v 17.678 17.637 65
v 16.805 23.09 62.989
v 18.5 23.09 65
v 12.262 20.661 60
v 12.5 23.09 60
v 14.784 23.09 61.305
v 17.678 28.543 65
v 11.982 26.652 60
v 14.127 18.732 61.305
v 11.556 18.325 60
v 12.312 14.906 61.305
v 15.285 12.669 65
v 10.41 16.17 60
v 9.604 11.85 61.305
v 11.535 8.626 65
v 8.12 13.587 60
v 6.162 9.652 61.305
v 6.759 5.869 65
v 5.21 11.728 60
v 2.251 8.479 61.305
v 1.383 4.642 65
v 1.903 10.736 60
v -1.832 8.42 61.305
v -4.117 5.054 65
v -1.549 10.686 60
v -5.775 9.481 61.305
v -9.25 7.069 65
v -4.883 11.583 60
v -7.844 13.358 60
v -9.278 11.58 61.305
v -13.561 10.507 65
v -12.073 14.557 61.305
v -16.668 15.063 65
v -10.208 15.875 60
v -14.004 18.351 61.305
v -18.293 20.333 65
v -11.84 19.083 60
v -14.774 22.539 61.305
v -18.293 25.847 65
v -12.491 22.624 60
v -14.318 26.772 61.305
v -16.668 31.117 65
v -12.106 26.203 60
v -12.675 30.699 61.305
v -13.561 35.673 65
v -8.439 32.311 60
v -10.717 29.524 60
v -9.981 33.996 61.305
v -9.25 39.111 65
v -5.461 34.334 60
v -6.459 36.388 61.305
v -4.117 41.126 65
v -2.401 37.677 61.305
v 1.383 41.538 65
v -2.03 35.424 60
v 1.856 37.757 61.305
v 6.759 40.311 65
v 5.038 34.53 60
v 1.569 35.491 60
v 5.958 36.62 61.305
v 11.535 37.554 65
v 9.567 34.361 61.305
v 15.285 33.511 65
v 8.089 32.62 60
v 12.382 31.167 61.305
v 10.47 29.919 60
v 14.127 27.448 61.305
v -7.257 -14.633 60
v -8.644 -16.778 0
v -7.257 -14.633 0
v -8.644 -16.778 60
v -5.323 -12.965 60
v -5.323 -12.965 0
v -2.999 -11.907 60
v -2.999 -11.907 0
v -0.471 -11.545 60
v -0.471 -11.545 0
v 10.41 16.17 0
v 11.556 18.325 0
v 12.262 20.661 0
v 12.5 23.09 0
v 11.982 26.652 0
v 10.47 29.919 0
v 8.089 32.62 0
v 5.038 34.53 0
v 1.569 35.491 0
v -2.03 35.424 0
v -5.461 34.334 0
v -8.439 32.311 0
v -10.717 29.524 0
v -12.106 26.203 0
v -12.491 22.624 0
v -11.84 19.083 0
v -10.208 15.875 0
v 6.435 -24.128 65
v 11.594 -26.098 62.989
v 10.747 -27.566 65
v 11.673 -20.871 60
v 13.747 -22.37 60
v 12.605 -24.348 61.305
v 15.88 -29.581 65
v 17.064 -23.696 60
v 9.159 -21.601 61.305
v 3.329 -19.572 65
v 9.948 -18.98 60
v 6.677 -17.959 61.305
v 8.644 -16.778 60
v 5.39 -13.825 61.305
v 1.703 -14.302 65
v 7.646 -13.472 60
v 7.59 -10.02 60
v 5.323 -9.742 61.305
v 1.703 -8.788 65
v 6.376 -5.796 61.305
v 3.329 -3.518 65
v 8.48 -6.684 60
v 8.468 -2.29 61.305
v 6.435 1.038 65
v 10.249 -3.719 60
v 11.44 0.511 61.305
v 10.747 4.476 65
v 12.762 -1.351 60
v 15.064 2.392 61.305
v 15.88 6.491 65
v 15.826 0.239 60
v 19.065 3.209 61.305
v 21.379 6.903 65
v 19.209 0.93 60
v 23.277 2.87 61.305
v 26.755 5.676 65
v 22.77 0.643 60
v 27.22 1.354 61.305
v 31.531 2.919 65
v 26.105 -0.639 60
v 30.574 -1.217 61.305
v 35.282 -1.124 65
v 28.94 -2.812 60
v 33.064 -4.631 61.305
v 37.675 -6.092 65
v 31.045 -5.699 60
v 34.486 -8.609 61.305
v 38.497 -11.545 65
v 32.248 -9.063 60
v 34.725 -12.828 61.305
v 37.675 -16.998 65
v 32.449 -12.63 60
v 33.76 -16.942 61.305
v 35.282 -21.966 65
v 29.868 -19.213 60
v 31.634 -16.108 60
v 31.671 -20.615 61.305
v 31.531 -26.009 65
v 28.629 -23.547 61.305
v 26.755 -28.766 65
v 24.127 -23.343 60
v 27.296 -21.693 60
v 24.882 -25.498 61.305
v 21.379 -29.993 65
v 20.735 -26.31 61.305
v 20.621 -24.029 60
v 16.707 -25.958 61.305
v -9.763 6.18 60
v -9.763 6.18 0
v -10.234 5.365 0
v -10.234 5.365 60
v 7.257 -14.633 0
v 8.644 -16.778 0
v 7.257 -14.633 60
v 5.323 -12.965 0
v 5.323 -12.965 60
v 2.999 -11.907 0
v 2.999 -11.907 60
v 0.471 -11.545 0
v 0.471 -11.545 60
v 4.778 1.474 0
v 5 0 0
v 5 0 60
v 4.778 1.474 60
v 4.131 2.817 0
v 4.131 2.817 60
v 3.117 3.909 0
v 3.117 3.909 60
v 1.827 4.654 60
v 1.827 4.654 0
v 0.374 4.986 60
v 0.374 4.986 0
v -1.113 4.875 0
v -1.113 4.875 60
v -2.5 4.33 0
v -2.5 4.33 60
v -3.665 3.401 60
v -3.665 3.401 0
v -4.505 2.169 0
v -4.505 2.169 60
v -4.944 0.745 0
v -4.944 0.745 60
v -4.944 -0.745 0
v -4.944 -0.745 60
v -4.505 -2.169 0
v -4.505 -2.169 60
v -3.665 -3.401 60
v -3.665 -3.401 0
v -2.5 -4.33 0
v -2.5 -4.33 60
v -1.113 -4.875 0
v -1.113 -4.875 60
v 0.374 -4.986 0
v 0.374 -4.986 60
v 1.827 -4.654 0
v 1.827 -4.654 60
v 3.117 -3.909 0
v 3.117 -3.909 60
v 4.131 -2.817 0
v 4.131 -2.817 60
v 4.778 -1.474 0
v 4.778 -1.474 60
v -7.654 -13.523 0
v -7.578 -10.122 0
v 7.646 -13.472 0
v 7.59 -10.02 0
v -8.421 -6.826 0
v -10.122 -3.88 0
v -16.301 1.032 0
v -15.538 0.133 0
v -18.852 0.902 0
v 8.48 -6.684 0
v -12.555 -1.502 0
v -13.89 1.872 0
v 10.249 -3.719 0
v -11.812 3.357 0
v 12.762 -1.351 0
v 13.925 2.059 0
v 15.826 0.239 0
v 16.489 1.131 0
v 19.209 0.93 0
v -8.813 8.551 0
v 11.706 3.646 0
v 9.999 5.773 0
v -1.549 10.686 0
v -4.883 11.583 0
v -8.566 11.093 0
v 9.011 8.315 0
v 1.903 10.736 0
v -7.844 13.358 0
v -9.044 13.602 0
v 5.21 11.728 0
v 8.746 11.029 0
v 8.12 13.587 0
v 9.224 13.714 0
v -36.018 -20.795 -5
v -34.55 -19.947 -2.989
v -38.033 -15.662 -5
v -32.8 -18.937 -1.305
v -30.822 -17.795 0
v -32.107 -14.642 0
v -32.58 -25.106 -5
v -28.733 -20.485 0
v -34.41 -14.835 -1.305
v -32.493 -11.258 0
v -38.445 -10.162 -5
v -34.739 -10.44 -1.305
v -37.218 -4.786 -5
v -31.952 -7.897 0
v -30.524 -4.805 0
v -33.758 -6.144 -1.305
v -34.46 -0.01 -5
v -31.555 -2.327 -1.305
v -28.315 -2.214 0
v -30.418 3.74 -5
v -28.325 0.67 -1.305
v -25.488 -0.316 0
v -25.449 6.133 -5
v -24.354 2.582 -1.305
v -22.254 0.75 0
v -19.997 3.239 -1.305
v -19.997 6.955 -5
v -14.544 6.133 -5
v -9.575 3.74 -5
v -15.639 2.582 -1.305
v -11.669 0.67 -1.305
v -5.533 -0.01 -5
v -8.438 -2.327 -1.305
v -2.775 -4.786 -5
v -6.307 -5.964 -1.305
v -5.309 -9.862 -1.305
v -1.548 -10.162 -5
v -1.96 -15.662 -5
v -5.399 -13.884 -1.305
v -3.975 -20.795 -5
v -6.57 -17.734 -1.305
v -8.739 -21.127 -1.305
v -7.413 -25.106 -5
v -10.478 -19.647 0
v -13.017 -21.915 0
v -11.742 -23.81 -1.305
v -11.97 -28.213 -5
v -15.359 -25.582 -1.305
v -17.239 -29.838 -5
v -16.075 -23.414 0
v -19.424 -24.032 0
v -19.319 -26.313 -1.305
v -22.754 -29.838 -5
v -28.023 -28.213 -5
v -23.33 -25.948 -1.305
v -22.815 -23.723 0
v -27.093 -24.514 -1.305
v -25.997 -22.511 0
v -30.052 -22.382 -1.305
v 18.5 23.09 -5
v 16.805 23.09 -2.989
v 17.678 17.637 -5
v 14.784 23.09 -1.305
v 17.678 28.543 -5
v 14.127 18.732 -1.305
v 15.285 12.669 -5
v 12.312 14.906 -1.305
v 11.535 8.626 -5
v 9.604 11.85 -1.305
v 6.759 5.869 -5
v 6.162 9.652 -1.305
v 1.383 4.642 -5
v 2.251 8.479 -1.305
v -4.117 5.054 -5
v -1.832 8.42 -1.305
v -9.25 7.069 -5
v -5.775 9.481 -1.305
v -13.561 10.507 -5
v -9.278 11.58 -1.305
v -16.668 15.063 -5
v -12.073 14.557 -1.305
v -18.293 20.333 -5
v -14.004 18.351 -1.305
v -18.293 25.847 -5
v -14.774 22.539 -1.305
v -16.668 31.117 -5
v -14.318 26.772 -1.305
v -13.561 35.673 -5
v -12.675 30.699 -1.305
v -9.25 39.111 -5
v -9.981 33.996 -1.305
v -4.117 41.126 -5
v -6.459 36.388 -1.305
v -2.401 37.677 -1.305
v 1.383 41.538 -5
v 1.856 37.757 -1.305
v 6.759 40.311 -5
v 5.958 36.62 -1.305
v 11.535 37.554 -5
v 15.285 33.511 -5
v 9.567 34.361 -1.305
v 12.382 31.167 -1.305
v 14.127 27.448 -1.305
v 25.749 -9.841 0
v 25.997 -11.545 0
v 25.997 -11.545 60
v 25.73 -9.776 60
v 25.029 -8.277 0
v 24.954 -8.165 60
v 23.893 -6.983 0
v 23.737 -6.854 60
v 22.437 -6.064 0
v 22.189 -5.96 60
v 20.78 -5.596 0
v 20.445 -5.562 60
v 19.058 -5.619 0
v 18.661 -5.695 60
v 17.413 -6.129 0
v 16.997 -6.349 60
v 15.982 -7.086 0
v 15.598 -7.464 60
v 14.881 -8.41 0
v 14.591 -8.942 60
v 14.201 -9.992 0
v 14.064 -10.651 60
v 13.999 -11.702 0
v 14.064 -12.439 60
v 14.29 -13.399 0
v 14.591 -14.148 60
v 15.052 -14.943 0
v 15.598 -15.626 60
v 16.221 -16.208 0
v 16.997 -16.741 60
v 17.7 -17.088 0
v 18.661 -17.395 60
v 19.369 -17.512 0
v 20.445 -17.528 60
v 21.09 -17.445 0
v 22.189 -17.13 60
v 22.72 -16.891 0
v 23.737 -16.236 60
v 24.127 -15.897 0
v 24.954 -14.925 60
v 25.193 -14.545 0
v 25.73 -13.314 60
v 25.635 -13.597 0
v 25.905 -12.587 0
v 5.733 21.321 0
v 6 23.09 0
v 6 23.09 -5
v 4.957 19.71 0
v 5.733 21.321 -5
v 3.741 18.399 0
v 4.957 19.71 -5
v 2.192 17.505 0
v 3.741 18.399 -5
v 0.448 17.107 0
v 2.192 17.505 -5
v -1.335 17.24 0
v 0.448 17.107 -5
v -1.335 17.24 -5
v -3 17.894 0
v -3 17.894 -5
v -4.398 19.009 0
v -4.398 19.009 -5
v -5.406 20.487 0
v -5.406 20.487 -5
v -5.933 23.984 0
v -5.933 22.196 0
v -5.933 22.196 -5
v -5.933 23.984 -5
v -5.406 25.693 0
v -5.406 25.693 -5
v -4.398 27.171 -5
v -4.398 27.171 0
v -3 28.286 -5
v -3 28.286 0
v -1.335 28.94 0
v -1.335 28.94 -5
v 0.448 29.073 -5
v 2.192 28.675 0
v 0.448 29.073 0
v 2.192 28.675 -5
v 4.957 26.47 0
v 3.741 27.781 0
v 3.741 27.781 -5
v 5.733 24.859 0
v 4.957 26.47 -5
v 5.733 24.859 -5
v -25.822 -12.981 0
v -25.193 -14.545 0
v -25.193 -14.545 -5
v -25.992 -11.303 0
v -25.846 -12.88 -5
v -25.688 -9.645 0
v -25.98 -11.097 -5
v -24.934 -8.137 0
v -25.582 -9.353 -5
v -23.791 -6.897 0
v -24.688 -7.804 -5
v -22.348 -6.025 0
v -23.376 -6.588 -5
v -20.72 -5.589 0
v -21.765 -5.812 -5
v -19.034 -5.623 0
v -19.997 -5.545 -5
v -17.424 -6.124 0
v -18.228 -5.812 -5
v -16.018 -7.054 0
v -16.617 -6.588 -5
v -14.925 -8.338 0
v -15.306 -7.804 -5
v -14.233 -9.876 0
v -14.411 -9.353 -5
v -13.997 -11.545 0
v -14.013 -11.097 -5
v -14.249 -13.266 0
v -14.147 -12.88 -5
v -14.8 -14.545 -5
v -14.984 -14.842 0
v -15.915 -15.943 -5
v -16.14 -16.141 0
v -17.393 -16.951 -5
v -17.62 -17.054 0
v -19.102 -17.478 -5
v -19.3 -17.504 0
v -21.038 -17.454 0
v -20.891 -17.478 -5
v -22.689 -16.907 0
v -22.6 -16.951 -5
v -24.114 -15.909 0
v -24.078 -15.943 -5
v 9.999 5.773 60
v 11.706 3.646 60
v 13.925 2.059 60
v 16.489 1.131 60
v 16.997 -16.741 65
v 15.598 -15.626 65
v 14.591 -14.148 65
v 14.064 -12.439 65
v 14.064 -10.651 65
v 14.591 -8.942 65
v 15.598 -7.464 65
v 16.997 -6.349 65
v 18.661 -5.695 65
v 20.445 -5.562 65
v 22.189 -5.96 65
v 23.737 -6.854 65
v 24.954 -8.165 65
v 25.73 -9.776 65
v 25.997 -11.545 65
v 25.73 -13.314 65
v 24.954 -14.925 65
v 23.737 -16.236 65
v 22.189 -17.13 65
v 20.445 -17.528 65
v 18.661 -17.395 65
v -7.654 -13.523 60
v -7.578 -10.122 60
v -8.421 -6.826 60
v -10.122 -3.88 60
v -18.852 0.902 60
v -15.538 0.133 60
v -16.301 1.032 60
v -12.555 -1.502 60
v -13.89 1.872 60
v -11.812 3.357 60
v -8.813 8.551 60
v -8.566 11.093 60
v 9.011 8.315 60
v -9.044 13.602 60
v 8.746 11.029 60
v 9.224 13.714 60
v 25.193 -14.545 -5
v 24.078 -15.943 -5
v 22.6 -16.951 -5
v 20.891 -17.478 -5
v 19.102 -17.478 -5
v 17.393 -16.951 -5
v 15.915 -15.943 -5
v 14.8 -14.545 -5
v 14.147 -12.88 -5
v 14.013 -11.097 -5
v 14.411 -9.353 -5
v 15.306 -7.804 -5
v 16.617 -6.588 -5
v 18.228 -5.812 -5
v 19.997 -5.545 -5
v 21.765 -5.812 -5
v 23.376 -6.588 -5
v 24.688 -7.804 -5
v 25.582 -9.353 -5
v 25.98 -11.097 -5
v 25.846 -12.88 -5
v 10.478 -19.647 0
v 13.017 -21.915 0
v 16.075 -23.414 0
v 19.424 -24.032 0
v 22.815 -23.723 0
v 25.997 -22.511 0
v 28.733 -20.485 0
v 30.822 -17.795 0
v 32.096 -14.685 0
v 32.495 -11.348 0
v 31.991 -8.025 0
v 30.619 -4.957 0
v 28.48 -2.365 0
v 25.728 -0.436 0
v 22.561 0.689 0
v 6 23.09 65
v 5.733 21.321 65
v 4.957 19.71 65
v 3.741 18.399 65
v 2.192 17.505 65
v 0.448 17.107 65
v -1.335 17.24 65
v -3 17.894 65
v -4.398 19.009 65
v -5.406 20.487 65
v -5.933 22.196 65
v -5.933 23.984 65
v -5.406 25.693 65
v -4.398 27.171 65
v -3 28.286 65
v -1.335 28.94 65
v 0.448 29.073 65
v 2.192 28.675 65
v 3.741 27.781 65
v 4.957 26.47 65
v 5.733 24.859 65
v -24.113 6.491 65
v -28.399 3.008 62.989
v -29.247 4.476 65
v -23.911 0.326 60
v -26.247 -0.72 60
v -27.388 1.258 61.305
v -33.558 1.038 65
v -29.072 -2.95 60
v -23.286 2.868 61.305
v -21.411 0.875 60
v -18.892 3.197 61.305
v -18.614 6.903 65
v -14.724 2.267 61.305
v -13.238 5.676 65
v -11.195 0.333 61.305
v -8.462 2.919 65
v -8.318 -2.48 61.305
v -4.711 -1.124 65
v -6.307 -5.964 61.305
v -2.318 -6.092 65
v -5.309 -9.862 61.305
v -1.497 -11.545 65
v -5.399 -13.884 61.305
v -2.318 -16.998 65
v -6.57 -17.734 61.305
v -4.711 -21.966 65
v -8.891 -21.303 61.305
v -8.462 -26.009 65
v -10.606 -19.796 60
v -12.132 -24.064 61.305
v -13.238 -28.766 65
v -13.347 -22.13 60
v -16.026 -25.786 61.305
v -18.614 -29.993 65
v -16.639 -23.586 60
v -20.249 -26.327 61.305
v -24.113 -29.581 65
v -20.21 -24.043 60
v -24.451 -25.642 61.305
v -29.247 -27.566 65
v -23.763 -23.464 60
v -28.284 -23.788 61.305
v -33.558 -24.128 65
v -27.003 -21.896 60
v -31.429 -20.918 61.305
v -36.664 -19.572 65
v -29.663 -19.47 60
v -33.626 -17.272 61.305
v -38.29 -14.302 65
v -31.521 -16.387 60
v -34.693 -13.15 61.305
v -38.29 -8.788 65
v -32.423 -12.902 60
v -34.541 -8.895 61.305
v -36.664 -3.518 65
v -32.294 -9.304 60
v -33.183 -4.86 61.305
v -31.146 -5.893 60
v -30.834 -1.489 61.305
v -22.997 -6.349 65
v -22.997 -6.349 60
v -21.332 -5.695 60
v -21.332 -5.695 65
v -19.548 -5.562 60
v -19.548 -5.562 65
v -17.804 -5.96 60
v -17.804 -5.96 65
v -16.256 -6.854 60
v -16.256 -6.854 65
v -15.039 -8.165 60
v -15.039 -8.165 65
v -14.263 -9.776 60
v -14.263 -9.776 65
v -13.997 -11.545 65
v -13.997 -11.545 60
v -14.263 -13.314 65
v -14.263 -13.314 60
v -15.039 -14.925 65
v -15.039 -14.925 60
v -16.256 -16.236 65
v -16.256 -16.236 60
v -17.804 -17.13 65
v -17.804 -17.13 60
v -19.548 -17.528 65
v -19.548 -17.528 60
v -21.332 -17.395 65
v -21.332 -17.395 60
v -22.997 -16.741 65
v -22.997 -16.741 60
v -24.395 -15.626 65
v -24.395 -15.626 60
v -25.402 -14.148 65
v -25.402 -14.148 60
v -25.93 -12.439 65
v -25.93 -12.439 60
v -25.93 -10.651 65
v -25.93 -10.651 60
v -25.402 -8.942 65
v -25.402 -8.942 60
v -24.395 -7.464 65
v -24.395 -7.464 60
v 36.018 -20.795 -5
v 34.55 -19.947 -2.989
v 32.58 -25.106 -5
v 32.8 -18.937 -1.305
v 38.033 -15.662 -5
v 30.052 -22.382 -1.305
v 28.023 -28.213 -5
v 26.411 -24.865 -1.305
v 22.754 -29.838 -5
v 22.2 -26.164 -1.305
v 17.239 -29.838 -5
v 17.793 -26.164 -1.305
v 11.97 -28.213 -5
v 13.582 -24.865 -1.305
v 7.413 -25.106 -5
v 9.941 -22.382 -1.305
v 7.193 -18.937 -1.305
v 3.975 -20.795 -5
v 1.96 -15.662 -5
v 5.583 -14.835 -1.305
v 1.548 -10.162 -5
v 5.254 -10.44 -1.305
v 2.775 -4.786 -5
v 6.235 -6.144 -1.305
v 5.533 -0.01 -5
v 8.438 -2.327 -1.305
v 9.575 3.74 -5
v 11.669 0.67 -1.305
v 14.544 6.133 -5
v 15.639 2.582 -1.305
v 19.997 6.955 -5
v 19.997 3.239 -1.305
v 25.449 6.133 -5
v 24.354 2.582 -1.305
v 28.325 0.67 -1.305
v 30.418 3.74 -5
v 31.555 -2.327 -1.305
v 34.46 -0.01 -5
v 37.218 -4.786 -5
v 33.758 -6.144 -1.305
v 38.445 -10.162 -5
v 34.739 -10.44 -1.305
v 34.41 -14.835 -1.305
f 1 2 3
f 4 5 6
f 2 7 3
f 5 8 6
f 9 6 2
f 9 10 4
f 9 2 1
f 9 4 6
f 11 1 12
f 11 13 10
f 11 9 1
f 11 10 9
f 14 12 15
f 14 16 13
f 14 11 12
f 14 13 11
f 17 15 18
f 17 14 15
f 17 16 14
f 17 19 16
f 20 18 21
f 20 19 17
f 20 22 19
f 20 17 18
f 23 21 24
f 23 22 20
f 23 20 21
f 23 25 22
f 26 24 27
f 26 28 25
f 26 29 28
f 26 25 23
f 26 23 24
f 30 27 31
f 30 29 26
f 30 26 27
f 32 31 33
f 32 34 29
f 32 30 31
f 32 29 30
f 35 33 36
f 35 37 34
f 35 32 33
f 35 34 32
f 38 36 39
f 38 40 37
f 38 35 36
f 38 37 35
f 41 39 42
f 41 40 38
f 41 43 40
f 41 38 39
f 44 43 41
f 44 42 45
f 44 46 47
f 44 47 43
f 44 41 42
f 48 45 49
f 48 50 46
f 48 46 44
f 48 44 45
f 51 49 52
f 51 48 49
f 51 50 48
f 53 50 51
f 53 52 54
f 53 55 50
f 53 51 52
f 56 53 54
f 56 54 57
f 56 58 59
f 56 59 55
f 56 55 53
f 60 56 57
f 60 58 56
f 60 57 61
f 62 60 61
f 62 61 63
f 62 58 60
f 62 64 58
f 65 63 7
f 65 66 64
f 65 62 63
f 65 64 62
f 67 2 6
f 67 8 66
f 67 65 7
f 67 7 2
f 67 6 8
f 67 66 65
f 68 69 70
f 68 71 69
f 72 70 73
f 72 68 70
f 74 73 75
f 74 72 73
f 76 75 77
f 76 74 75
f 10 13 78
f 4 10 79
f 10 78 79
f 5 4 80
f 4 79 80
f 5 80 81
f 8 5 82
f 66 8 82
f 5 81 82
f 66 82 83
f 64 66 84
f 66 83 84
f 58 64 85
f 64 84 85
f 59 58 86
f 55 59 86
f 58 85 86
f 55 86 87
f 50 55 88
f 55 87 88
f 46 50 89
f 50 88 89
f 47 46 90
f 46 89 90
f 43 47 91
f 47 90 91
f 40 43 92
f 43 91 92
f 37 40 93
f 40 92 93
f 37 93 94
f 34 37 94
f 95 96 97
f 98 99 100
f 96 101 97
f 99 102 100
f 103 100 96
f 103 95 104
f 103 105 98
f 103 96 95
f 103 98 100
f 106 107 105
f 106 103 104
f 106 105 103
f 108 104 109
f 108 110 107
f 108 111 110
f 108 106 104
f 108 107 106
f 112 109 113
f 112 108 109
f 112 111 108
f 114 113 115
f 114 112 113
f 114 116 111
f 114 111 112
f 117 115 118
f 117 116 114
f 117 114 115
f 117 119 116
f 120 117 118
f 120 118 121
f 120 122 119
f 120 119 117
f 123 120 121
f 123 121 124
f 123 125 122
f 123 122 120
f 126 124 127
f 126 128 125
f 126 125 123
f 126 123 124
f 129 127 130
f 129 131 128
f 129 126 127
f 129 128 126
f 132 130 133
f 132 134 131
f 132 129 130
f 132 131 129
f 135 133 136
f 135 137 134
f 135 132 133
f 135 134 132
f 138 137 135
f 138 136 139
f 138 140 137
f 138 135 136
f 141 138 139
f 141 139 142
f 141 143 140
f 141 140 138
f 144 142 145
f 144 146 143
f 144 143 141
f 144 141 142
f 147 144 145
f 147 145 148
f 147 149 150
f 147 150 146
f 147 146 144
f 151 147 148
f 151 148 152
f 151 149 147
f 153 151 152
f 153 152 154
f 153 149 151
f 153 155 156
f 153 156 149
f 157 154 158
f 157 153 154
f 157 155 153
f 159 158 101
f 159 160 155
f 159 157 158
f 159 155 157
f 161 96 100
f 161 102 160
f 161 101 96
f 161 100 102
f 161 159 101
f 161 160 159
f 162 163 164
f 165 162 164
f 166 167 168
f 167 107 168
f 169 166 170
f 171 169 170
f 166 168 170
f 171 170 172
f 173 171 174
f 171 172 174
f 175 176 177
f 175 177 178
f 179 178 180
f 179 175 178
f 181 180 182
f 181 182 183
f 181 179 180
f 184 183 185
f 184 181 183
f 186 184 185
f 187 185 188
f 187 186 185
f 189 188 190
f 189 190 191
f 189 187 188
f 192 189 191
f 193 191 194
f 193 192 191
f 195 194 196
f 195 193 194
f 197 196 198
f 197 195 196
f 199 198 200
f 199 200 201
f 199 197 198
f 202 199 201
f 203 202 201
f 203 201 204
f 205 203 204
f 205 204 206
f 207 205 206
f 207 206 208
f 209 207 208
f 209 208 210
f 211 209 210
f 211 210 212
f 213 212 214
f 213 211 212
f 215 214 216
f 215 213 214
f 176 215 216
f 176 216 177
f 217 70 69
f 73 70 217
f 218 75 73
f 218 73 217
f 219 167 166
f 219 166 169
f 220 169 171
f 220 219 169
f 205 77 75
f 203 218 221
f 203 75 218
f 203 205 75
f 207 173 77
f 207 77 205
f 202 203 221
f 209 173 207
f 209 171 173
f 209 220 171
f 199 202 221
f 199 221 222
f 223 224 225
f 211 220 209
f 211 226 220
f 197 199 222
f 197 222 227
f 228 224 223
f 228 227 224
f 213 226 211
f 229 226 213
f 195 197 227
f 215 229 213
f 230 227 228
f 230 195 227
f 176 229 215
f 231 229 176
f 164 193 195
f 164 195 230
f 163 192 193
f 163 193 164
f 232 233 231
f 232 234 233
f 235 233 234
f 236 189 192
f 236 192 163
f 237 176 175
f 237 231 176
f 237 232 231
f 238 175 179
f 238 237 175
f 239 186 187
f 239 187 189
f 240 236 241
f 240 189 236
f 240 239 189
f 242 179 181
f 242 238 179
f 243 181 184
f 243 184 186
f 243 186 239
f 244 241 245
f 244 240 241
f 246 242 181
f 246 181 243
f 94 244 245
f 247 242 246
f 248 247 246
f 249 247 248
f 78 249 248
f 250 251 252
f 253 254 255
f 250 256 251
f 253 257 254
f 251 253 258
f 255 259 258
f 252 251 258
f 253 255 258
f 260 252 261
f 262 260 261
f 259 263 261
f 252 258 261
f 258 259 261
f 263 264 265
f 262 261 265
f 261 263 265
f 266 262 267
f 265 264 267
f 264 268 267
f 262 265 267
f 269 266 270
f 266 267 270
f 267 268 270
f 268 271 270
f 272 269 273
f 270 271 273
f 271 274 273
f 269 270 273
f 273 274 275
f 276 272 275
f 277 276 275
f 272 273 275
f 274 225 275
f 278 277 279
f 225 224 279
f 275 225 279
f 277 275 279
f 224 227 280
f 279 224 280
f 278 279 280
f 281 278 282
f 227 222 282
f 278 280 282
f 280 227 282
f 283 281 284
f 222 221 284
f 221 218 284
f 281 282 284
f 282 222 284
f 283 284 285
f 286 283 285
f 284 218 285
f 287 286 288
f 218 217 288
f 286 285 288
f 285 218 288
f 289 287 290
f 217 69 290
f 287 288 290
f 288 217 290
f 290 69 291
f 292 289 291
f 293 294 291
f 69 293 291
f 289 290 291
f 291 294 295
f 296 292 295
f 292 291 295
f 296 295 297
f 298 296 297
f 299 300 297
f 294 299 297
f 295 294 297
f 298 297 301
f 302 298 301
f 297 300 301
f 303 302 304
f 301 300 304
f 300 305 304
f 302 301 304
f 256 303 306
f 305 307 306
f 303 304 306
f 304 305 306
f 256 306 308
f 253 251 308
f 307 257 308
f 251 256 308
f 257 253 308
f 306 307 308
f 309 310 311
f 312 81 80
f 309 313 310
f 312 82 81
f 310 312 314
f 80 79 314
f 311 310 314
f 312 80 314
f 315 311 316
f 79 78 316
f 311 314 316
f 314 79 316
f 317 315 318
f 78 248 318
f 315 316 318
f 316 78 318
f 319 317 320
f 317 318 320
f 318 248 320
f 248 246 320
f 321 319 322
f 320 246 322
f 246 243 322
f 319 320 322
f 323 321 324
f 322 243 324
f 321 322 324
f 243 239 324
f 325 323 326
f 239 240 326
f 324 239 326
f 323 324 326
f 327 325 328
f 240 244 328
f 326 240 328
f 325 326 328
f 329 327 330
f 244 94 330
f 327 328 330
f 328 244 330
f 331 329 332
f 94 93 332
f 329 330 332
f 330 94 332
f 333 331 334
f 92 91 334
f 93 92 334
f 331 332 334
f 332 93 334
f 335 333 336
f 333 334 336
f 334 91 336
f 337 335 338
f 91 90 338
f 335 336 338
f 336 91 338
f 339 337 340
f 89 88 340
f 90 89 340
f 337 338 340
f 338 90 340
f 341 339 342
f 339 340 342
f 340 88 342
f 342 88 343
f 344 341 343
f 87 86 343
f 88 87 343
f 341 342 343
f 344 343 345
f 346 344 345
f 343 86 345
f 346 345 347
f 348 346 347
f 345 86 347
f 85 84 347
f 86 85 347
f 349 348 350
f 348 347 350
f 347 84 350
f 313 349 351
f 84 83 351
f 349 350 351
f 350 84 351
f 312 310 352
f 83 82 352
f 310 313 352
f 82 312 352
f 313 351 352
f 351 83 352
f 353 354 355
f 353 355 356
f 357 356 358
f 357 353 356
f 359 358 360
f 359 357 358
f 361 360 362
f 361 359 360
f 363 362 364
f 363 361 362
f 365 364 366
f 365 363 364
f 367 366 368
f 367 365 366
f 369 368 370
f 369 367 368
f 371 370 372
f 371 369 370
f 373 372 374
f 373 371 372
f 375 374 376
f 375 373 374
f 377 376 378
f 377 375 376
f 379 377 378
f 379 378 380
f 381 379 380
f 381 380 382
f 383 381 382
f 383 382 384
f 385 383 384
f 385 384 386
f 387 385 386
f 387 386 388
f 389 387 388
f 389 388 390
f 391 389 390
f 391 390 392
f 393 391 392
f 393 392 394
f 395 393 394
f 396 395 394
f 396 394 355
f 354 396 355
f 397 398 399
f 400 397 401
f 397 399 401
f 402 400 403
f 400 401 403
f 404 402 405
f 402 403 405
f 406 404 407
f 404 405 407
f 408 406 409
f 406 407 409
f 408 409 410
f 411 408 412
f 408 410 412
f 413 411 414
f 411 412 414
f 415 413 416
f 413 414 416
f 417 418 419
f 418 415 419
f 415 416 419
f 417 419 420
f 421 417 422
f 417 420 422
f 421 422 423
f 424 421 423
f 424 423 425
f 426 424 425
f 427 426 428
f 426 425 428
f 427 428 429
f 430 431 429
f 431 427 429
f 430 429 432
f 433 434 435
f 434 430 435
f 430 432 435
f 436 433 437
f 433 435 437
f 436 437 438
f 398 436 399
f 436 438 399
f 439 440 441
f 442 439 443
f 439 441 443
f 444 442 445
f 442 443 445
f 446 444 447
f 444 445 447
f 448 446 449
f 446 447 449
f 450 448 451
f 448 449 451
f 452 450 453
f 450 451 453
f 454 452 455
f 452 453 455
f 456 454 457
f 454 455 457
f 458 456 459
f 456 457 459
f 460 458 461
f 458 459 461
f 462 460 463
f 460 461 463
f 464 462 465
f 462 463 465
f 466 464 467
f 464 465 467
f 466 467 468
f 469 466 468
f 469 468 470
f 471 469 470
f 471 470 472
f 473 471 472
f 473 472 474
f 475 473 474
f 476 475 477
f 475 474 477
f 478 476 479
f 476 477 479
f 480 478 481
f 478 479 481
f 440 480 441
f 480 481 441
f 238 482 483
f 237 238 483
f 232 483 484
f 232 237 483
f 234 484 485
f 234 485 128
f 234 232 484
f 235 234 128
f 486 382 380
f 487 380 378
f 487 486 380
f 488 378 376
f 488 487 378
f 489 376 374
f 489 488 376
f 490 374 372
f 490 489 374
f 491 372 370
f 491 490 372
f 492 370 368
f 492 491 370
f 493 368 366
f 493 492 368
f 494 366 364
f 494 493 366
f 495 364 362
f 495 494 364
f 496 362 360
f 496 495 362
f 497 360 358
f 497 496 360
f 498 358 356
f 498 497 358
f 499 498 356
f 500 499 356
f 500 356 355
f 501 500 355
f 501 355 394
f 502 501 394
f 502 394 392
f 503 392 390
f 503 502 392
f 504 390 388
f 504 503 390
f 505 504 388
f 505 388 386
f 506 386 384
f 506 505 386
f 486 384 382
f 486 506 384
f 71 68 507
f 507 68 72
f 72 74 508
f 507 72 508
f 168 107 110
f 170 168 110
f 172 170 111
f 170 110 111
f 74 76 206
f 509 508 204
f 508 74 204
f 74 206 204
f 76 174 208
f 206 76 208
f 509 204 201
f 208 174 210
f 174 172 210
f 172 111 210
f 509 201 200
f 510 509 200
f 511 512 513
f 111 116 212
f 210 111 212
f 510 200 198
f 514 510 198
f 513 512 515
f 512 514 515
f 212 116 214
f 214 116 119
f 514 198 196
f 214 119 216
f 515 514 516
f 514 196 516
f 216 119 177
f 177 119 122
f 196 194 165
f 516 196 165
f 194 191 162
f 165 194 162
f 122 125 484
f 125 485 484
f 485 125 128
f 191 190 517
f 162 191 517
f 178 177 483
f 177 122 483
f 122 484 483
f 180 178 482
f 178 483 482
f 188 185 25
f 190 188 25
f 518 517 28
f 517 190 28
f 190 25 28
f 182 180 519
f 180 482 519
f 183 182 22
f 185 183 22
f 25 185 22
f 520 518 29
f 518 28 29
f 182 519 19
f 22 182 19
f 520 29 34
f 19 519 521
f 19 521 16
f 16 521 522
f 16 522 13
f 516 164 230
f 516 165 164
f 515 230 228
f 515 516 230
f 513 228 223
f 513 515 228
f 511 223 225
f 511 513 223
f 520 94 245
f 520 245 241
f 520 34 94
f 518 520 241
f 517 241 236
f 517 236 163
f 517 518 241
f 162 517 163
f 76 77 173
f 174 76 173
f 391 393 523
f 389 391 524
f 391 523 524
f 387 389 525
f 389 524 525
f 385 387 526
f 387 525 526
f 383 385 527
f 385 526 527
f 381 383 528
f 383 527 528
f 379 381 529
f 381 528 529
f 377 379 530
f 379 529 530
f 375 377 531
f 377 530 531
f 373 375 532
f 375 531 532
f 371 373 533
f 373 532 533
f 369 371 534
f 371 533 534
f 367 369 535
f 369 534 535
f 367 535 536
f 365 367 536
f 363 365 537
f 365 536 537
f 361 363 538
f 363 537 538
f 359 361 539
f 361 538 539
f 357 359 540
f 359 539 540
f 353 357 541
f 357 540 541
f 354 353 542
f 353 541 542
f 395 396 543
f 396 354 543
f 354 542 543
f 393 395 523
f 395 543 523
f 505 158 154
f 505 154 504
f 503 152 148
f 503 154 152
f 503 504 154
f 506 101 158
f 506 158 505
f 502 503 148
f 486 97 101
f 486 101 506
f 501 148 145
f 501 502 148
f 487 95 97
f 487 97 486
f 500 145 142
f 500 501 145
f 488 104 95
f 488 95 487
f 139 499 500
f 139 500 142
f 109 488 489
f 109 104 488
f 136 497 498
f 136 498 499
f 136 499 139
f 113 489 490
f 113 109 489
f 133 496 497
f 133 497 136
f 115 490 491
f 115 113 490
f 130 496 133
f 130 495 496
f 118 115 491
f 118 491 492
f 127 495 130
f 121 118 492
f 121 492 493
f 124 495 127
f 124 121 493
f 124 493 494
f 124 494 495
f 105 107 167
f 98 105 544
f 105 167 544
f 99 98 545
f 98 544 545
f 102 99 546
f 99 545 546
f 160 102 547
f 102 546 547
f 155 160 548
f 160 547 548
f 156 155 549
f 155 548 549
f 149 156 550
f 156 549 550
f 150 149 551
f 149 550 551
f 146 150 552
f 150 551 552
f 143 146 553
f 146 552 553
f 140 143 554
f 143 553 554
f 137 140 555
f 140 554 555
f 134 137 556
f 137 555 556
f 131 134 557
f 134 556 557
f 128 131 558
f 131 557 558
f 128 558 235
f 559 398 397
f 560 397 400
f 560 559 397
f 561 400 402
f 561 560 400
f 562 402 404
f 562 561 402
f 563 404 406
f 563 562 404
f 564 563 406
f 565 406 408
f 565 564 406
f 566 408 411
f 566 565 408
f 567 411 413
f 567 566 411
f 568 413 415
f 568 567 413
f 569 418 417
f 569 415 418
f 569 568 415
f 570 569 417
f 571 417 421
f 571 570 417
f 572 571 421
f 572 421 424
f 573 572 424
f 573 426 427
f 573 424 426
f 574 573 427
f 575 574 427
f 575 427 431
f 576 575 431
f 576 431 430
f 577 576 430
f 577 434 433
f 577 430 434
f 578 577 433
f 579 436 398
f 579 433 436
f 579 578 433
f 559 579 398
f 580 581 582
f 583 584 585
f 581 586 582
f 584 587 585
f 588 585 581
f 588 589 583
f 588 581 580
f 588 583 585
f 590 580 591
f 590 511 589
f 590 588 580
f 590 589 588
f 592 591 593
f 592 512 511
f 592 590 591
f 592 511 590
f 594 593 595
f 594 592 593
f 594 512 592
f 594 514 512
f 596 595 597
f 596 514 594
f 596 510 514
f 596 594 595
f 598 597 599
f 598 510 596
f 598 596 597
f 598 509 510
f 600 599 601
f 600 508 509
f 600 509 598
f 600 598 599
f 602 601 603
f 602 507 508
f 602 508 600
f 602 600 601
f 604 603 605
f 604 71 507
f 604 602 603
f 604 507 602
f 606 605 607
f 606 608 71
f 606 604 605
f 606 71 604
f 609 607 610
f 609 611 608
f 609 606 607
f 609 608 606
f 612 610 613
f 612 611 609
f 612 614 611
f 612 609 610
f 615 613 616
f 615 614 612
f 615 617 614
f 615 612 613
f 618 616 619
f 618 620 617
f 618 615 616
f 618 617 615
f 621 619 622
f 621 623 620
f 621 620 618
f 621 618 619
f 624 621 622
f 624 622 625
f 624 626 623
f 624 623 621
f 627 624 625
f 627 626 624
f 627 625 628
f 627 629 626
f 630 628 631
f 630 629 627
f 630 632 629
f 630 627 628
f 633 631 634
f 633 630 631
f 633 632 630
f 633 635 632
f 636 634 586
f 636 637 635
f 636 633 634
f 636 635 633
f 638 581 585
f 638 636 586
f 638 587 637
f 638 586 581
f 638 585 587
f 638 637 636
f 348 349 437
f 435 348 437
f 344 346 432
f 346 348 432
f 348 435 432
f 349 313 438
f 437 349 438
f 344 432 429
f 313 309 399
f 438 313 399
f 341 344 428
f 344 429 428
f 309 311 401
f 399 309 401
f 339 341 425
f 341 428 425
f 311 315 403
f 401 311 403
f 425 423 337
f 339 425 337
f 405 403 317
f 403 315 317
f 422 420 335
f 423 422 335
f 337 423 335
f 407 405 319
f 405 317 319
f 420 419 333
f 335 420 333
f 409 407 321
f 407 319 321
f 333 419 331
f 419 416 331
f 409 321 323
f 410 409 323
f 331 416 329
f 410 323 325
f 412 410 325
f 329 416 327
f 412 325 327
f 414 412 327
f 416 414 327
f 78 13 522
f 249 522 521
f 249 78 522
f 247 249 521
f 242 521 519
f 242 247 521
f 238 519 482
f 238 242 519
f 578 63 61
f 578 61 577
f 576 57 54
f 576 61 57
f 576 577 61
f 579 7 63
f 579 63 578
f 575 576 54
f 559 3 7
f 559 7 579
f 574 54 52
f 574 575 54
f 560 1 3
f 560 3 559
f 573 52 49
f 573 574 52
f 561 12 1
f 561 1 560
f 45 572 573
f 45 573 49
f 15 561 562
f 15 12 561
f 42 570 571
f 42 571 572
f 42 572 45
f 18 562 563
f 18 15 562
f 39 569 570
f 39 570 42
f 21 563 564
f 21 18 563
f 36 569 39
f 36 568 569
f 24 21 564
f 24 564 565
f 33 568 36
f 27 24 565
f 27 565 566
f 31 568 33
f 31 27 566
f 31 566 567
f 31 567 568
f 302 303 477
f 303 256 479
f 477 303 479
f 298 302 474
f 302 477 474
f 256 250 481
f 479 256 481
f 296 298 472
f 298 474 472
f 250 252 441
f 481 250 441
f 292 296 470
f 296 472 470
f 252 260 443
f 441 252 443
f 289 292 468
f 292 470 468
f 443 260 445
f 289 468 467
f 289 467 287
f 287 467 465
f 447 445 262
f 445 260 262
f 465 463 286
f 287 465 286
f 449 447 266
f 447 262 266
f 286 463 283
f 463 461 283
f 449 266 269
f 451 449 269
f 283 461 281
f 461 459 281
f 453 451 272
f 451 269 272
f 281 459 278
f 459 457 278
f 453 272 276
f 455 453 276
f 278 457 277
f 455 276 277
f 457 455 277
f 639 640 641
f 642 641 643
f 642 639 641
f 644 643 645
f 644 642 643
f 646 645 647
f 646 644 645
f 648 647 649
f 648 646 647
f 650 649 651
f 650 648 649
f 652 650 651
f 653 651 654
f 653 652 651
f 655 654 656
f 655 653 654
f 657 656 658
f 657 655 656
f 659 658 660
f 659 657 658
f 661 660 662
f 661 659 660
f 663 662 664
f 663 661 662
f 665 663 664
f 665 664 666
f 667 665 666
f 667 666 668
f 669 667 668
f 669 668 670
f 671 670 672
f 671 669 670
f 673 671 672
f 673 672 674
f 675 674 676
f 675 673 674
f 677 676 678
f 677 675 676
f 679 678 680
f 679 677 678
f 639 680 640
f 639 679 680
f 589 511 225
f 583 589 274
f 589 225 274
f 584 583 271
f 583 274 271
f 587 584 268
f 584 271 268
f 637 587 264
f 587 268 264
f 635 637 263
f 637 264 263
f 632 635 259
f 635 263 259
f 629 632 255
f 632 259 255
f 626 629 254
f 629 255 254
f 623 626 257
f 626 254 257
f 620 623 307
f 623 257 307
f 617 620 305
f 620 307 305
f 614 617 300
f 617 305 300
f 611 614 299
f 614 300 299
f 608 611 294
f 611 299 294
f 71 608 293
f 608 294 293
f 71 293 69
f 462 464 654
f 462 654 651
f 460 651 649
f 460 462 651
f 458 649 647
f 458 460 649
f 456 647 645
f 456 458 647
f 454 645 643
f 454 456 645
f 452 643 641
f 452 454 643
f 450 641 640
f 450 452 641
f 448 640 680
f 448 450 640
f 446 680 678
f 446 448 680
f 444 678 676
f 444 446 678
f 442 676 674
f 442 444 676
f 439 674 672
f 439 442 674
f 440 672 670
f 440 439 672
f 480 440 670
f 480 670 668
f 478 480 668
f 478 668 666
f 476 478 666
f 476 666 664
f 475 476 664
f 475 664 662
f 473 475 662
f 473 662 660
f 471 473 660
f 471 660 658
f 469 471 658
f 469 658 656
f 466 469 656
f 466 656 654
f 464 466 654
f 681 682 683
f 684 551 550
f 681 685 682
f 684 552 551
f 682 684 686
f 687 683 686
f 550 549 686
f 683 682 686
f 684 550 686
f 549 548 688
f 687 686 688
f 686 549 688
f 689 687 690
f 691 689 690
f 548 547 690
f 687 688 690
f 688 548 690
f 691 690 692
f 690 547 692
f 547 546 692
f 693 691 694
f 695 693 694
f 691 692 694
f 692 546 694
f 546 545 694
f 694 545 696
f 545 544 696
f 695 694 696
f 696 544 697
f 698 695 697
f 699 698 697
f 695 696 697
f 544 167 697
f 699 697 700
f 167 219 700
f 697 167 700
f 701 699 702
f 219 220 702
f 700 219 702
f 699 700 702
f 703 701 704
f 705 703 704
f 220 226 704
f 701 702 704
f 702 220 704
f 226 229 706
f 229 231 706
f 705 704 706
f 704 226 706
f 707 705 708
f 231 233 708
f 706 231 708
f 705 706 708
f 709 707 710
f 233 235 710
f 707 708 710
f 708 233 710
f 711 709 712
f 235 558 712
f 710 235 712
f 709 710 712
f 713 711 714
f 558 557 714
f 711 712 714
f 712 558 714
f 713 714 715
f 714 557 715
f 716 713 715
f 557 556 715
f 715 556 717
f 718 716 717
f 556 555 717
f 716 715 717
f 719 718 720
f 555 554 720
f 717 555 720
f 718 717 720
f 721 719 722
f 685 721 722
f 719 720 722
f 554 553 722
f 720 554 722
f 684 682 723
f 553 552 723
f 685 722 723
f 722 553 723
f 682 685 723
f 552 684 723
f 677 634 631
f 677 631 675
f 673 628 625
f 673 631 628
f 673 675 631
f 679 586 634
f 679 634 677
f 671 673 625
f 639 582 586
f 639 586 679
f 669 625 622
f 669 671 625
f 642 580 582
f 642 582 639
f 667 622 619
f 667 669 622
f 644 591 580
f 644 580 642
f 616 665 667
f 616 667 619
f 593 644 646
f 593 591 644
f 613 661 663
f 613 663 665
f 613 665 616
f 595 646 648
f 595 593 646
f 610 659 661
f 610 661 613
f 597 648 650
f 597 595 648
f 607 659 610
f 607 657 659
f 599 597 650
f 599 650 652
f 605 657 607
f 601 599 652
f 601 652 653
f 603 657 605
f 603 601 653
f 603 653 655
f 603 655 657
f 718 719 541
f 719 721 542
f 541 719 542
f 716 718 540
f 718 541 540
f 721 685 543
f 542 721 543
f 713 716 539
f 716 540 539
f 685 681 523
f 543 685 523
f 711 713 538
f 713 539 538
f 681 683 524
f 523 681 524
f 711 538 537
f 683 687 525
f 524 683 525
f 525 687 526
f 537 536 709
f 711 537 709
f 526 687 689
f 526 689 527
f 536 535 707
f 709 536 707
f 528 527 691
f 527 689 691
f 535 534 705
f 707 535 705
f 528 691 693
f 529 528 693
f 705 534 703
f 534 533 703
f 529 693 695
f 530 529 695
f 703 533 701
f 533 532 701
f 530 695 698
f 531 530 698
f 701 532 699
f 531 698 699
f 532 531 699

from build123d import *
from build123d.topology import SkipClean

# Parameters (mm, degrees)
SKETCH1_R           = 6
SKETCH1_R_2         = 5
BOSS_EXTRUDE1_DEPTH = 60
FILLET1_R           = 10
FILLET2_R           = 9
CIRPATTERN1_COUNT   = 3


with BuildPart() as part:
    # Sketch1 → Boss-Extrude1 (new body)
    with BuildSketch(Plane.XY):
        with BuildLine():
            ThreePointArc((7.496526573, -11.545), (30.821844121, -17.795), (13.746526573, -0.719682453))
            Line((13.746526573, -0.719682453), (6.25, 12.264682453))
            ThreePointArc((6.25, 12.264682453), (0, 35.59), (-6.25, 12.264682453))
            Line((-6.25, 12.264682453), (-13.746526573, -0.719682453))
            ThreePointArc((-13.746526573, -0.719682453), (-30.821844121, -17.795), (-7.496526573, -11.545))
            Line((-7.496526573, -11.545), (7.496526573, -11.545))
        make_face()
        with Locations((19.996526573, -11.545)):
            Circle(SKETCH1_R, mode=Mode.SUBTRACT)
        with Locations((0, 23.09)):
            Circle(SKETCH1_R, mode=Mode.SUBTRACT)
        Circle(SKETCH1_R_2, mode=Mode.SUBTRACT)
        with Locations((-19.996526573, -11.545)):
            Circle(SKETCH1_R, mode=Mode.SUBTRACT)
    extrude(amount=BOSS_EXTRUDE1_DEPTH)

    # Fillet1
    # the kernel refuses this fillet: 10 mm, written as the material it adds along each edge
    with BuildSketch(Plane(origin=(13.746526573, -0.719682453, 0), x_dir=(0.9572887202141619, 0.28913371673108657, 0), z_dir=(0, 0, 1))) as fillet1_piece_1:
        with BuildLine():
            CenterArc((7.988652571, 9.736032088), FILLET1_R, 193.193899981, 63.612200039)
            Line((-1.747379517, 7.453559925), (0, 0))
            ThreePointArc((0, 0), (2.853090204, 0.32995989), (5.706180408, 0))
        make_face()
    extrude(amount=60)
    with BuildSketch(Plane(origin=(6.25, 12.264682453, 0), x_dir=(0.4999999999999975, -0.86602540378444, 0), z_dir=(0, 0, 1))) as fillet1_piece_2:
        with BuildLine():
            CenterArc((7.655644371, 10), FILLET1_R, 206.387799961, 63.612200039)
            ThreePointArc((-1.302419794, 5.555555556), (-0.32995989, 2.853090204), (0, 0))
            Line((0, 0), (7.655644371, 0))
        make_face()
    extrude(amount=60)

    # Fillet2
    fillet2_edges = [part.edges().sort_by_distance(p)[0] for p in [
        (7.496526573, -11.545, 30),
        (-7.496526573, -11.545, 30),
        (-13.746526573, -0.719682453, 30),
        (-6.25, 12.264682453, 30),
    ]]
    fillet(fillet2_edges, radius=FILLET2_R)

    # Sketch2 → Revolve3 (revolve)
    with BuildSketch(Plane(origin=(0, 0, 0), x_dir=(0, 0, -1), z_dir=(1, 0, 0)), mode=Mode.PRIVATE) as revolve3_sk:
        with BuildLine():
            Line((-60, 35.59), (-60, 29.09))
            Line((-60, 29.09), (-65, 29.09))
            Line((-65, 29.09), (-65, 41.59))
            ThreePointArc((-65, 41.59), (-62.102636282, 38.921136432), (-60, 35.59))
        make_face()
    revolve3 = revolve(revolve3_sk.sketch.rotate(Axis((0, 23.09, 60), (0, 0, -1)), 90), axis=Axis((0, 23.09, 60), (0, 0, -1)))

    # CirPattern1: Revolve3 ×3 about axis
    with SkipClean():  # the faces are left unmerged after this step: merging them gives an invalid solid
        cirpattern1_axis = Axis((0, 0, 0), (0, 0, 1))
        for i in range(1, CIRPATTERN1_COUNT):
            add(revolve3.rotate(cirpattern1_axis, i * 360 / CIRPATTERN1_COUNT))

    # Mirror1: Revolve3 across plane
    with SkipClean():  # the faces are left unmerged after this step: merging them gives an invalid solid
        add(revolve3.mirror(Plane.XY.offset(30)))

    # Mirror1 copy 1 sketch → Mirror1 copy 1 (revolve)
    with SkipClean():  # the faces are left unmerged after this step: merging them gives an invalid solid
        with BuildSketch(Plane(origin=(0, 0, 60), x_dir=(0, 0, 1), z_dir=(-0.4999999999999998, 0.8660254037844387, 0))):
            with BuildLine():
                Line((-60, -35.59), (-60, -29.09))
                Line((-60, -29.09), (-65, -29.09))
                Line((-65, -29.09), (-65, -41.59))
                ThreePointArc((-65, -41.59), (-62.102636282, -38.921136432), (-60, -35.59))
            make_face()
        revolve(axis=Axis((-19.996526573, -11.545, 0), (0, 0, -1)))

    # Mirror1 copy 2 sketch → Mirror1 copy 2 (revolve)
    with SkipClean():  # the faces are left unmerged after this step: merging them gives an invalid solid
        with BuildSketch(Plane(origin=(0, 0, 60), x_dir=(0, 0, 1), z_dir=(-0.5000000000000004, -0.8660254037844384, 0))):
            with BuildLine():
                Line((-60, -35.59), (-60, -29.09))
                Line((-60, -29.09), (-65, -29.09))
                Line((-65, -29.09), (-65, -41.59))
                ThreePointArc((-65, -41.59), (-62.102636282, -38.921136432), (-60, -35.59))
            make_face()
        revolve(axis=Axis((19.996526573, -11.545, 0), (0, 0, -1)))


solid = part.part
